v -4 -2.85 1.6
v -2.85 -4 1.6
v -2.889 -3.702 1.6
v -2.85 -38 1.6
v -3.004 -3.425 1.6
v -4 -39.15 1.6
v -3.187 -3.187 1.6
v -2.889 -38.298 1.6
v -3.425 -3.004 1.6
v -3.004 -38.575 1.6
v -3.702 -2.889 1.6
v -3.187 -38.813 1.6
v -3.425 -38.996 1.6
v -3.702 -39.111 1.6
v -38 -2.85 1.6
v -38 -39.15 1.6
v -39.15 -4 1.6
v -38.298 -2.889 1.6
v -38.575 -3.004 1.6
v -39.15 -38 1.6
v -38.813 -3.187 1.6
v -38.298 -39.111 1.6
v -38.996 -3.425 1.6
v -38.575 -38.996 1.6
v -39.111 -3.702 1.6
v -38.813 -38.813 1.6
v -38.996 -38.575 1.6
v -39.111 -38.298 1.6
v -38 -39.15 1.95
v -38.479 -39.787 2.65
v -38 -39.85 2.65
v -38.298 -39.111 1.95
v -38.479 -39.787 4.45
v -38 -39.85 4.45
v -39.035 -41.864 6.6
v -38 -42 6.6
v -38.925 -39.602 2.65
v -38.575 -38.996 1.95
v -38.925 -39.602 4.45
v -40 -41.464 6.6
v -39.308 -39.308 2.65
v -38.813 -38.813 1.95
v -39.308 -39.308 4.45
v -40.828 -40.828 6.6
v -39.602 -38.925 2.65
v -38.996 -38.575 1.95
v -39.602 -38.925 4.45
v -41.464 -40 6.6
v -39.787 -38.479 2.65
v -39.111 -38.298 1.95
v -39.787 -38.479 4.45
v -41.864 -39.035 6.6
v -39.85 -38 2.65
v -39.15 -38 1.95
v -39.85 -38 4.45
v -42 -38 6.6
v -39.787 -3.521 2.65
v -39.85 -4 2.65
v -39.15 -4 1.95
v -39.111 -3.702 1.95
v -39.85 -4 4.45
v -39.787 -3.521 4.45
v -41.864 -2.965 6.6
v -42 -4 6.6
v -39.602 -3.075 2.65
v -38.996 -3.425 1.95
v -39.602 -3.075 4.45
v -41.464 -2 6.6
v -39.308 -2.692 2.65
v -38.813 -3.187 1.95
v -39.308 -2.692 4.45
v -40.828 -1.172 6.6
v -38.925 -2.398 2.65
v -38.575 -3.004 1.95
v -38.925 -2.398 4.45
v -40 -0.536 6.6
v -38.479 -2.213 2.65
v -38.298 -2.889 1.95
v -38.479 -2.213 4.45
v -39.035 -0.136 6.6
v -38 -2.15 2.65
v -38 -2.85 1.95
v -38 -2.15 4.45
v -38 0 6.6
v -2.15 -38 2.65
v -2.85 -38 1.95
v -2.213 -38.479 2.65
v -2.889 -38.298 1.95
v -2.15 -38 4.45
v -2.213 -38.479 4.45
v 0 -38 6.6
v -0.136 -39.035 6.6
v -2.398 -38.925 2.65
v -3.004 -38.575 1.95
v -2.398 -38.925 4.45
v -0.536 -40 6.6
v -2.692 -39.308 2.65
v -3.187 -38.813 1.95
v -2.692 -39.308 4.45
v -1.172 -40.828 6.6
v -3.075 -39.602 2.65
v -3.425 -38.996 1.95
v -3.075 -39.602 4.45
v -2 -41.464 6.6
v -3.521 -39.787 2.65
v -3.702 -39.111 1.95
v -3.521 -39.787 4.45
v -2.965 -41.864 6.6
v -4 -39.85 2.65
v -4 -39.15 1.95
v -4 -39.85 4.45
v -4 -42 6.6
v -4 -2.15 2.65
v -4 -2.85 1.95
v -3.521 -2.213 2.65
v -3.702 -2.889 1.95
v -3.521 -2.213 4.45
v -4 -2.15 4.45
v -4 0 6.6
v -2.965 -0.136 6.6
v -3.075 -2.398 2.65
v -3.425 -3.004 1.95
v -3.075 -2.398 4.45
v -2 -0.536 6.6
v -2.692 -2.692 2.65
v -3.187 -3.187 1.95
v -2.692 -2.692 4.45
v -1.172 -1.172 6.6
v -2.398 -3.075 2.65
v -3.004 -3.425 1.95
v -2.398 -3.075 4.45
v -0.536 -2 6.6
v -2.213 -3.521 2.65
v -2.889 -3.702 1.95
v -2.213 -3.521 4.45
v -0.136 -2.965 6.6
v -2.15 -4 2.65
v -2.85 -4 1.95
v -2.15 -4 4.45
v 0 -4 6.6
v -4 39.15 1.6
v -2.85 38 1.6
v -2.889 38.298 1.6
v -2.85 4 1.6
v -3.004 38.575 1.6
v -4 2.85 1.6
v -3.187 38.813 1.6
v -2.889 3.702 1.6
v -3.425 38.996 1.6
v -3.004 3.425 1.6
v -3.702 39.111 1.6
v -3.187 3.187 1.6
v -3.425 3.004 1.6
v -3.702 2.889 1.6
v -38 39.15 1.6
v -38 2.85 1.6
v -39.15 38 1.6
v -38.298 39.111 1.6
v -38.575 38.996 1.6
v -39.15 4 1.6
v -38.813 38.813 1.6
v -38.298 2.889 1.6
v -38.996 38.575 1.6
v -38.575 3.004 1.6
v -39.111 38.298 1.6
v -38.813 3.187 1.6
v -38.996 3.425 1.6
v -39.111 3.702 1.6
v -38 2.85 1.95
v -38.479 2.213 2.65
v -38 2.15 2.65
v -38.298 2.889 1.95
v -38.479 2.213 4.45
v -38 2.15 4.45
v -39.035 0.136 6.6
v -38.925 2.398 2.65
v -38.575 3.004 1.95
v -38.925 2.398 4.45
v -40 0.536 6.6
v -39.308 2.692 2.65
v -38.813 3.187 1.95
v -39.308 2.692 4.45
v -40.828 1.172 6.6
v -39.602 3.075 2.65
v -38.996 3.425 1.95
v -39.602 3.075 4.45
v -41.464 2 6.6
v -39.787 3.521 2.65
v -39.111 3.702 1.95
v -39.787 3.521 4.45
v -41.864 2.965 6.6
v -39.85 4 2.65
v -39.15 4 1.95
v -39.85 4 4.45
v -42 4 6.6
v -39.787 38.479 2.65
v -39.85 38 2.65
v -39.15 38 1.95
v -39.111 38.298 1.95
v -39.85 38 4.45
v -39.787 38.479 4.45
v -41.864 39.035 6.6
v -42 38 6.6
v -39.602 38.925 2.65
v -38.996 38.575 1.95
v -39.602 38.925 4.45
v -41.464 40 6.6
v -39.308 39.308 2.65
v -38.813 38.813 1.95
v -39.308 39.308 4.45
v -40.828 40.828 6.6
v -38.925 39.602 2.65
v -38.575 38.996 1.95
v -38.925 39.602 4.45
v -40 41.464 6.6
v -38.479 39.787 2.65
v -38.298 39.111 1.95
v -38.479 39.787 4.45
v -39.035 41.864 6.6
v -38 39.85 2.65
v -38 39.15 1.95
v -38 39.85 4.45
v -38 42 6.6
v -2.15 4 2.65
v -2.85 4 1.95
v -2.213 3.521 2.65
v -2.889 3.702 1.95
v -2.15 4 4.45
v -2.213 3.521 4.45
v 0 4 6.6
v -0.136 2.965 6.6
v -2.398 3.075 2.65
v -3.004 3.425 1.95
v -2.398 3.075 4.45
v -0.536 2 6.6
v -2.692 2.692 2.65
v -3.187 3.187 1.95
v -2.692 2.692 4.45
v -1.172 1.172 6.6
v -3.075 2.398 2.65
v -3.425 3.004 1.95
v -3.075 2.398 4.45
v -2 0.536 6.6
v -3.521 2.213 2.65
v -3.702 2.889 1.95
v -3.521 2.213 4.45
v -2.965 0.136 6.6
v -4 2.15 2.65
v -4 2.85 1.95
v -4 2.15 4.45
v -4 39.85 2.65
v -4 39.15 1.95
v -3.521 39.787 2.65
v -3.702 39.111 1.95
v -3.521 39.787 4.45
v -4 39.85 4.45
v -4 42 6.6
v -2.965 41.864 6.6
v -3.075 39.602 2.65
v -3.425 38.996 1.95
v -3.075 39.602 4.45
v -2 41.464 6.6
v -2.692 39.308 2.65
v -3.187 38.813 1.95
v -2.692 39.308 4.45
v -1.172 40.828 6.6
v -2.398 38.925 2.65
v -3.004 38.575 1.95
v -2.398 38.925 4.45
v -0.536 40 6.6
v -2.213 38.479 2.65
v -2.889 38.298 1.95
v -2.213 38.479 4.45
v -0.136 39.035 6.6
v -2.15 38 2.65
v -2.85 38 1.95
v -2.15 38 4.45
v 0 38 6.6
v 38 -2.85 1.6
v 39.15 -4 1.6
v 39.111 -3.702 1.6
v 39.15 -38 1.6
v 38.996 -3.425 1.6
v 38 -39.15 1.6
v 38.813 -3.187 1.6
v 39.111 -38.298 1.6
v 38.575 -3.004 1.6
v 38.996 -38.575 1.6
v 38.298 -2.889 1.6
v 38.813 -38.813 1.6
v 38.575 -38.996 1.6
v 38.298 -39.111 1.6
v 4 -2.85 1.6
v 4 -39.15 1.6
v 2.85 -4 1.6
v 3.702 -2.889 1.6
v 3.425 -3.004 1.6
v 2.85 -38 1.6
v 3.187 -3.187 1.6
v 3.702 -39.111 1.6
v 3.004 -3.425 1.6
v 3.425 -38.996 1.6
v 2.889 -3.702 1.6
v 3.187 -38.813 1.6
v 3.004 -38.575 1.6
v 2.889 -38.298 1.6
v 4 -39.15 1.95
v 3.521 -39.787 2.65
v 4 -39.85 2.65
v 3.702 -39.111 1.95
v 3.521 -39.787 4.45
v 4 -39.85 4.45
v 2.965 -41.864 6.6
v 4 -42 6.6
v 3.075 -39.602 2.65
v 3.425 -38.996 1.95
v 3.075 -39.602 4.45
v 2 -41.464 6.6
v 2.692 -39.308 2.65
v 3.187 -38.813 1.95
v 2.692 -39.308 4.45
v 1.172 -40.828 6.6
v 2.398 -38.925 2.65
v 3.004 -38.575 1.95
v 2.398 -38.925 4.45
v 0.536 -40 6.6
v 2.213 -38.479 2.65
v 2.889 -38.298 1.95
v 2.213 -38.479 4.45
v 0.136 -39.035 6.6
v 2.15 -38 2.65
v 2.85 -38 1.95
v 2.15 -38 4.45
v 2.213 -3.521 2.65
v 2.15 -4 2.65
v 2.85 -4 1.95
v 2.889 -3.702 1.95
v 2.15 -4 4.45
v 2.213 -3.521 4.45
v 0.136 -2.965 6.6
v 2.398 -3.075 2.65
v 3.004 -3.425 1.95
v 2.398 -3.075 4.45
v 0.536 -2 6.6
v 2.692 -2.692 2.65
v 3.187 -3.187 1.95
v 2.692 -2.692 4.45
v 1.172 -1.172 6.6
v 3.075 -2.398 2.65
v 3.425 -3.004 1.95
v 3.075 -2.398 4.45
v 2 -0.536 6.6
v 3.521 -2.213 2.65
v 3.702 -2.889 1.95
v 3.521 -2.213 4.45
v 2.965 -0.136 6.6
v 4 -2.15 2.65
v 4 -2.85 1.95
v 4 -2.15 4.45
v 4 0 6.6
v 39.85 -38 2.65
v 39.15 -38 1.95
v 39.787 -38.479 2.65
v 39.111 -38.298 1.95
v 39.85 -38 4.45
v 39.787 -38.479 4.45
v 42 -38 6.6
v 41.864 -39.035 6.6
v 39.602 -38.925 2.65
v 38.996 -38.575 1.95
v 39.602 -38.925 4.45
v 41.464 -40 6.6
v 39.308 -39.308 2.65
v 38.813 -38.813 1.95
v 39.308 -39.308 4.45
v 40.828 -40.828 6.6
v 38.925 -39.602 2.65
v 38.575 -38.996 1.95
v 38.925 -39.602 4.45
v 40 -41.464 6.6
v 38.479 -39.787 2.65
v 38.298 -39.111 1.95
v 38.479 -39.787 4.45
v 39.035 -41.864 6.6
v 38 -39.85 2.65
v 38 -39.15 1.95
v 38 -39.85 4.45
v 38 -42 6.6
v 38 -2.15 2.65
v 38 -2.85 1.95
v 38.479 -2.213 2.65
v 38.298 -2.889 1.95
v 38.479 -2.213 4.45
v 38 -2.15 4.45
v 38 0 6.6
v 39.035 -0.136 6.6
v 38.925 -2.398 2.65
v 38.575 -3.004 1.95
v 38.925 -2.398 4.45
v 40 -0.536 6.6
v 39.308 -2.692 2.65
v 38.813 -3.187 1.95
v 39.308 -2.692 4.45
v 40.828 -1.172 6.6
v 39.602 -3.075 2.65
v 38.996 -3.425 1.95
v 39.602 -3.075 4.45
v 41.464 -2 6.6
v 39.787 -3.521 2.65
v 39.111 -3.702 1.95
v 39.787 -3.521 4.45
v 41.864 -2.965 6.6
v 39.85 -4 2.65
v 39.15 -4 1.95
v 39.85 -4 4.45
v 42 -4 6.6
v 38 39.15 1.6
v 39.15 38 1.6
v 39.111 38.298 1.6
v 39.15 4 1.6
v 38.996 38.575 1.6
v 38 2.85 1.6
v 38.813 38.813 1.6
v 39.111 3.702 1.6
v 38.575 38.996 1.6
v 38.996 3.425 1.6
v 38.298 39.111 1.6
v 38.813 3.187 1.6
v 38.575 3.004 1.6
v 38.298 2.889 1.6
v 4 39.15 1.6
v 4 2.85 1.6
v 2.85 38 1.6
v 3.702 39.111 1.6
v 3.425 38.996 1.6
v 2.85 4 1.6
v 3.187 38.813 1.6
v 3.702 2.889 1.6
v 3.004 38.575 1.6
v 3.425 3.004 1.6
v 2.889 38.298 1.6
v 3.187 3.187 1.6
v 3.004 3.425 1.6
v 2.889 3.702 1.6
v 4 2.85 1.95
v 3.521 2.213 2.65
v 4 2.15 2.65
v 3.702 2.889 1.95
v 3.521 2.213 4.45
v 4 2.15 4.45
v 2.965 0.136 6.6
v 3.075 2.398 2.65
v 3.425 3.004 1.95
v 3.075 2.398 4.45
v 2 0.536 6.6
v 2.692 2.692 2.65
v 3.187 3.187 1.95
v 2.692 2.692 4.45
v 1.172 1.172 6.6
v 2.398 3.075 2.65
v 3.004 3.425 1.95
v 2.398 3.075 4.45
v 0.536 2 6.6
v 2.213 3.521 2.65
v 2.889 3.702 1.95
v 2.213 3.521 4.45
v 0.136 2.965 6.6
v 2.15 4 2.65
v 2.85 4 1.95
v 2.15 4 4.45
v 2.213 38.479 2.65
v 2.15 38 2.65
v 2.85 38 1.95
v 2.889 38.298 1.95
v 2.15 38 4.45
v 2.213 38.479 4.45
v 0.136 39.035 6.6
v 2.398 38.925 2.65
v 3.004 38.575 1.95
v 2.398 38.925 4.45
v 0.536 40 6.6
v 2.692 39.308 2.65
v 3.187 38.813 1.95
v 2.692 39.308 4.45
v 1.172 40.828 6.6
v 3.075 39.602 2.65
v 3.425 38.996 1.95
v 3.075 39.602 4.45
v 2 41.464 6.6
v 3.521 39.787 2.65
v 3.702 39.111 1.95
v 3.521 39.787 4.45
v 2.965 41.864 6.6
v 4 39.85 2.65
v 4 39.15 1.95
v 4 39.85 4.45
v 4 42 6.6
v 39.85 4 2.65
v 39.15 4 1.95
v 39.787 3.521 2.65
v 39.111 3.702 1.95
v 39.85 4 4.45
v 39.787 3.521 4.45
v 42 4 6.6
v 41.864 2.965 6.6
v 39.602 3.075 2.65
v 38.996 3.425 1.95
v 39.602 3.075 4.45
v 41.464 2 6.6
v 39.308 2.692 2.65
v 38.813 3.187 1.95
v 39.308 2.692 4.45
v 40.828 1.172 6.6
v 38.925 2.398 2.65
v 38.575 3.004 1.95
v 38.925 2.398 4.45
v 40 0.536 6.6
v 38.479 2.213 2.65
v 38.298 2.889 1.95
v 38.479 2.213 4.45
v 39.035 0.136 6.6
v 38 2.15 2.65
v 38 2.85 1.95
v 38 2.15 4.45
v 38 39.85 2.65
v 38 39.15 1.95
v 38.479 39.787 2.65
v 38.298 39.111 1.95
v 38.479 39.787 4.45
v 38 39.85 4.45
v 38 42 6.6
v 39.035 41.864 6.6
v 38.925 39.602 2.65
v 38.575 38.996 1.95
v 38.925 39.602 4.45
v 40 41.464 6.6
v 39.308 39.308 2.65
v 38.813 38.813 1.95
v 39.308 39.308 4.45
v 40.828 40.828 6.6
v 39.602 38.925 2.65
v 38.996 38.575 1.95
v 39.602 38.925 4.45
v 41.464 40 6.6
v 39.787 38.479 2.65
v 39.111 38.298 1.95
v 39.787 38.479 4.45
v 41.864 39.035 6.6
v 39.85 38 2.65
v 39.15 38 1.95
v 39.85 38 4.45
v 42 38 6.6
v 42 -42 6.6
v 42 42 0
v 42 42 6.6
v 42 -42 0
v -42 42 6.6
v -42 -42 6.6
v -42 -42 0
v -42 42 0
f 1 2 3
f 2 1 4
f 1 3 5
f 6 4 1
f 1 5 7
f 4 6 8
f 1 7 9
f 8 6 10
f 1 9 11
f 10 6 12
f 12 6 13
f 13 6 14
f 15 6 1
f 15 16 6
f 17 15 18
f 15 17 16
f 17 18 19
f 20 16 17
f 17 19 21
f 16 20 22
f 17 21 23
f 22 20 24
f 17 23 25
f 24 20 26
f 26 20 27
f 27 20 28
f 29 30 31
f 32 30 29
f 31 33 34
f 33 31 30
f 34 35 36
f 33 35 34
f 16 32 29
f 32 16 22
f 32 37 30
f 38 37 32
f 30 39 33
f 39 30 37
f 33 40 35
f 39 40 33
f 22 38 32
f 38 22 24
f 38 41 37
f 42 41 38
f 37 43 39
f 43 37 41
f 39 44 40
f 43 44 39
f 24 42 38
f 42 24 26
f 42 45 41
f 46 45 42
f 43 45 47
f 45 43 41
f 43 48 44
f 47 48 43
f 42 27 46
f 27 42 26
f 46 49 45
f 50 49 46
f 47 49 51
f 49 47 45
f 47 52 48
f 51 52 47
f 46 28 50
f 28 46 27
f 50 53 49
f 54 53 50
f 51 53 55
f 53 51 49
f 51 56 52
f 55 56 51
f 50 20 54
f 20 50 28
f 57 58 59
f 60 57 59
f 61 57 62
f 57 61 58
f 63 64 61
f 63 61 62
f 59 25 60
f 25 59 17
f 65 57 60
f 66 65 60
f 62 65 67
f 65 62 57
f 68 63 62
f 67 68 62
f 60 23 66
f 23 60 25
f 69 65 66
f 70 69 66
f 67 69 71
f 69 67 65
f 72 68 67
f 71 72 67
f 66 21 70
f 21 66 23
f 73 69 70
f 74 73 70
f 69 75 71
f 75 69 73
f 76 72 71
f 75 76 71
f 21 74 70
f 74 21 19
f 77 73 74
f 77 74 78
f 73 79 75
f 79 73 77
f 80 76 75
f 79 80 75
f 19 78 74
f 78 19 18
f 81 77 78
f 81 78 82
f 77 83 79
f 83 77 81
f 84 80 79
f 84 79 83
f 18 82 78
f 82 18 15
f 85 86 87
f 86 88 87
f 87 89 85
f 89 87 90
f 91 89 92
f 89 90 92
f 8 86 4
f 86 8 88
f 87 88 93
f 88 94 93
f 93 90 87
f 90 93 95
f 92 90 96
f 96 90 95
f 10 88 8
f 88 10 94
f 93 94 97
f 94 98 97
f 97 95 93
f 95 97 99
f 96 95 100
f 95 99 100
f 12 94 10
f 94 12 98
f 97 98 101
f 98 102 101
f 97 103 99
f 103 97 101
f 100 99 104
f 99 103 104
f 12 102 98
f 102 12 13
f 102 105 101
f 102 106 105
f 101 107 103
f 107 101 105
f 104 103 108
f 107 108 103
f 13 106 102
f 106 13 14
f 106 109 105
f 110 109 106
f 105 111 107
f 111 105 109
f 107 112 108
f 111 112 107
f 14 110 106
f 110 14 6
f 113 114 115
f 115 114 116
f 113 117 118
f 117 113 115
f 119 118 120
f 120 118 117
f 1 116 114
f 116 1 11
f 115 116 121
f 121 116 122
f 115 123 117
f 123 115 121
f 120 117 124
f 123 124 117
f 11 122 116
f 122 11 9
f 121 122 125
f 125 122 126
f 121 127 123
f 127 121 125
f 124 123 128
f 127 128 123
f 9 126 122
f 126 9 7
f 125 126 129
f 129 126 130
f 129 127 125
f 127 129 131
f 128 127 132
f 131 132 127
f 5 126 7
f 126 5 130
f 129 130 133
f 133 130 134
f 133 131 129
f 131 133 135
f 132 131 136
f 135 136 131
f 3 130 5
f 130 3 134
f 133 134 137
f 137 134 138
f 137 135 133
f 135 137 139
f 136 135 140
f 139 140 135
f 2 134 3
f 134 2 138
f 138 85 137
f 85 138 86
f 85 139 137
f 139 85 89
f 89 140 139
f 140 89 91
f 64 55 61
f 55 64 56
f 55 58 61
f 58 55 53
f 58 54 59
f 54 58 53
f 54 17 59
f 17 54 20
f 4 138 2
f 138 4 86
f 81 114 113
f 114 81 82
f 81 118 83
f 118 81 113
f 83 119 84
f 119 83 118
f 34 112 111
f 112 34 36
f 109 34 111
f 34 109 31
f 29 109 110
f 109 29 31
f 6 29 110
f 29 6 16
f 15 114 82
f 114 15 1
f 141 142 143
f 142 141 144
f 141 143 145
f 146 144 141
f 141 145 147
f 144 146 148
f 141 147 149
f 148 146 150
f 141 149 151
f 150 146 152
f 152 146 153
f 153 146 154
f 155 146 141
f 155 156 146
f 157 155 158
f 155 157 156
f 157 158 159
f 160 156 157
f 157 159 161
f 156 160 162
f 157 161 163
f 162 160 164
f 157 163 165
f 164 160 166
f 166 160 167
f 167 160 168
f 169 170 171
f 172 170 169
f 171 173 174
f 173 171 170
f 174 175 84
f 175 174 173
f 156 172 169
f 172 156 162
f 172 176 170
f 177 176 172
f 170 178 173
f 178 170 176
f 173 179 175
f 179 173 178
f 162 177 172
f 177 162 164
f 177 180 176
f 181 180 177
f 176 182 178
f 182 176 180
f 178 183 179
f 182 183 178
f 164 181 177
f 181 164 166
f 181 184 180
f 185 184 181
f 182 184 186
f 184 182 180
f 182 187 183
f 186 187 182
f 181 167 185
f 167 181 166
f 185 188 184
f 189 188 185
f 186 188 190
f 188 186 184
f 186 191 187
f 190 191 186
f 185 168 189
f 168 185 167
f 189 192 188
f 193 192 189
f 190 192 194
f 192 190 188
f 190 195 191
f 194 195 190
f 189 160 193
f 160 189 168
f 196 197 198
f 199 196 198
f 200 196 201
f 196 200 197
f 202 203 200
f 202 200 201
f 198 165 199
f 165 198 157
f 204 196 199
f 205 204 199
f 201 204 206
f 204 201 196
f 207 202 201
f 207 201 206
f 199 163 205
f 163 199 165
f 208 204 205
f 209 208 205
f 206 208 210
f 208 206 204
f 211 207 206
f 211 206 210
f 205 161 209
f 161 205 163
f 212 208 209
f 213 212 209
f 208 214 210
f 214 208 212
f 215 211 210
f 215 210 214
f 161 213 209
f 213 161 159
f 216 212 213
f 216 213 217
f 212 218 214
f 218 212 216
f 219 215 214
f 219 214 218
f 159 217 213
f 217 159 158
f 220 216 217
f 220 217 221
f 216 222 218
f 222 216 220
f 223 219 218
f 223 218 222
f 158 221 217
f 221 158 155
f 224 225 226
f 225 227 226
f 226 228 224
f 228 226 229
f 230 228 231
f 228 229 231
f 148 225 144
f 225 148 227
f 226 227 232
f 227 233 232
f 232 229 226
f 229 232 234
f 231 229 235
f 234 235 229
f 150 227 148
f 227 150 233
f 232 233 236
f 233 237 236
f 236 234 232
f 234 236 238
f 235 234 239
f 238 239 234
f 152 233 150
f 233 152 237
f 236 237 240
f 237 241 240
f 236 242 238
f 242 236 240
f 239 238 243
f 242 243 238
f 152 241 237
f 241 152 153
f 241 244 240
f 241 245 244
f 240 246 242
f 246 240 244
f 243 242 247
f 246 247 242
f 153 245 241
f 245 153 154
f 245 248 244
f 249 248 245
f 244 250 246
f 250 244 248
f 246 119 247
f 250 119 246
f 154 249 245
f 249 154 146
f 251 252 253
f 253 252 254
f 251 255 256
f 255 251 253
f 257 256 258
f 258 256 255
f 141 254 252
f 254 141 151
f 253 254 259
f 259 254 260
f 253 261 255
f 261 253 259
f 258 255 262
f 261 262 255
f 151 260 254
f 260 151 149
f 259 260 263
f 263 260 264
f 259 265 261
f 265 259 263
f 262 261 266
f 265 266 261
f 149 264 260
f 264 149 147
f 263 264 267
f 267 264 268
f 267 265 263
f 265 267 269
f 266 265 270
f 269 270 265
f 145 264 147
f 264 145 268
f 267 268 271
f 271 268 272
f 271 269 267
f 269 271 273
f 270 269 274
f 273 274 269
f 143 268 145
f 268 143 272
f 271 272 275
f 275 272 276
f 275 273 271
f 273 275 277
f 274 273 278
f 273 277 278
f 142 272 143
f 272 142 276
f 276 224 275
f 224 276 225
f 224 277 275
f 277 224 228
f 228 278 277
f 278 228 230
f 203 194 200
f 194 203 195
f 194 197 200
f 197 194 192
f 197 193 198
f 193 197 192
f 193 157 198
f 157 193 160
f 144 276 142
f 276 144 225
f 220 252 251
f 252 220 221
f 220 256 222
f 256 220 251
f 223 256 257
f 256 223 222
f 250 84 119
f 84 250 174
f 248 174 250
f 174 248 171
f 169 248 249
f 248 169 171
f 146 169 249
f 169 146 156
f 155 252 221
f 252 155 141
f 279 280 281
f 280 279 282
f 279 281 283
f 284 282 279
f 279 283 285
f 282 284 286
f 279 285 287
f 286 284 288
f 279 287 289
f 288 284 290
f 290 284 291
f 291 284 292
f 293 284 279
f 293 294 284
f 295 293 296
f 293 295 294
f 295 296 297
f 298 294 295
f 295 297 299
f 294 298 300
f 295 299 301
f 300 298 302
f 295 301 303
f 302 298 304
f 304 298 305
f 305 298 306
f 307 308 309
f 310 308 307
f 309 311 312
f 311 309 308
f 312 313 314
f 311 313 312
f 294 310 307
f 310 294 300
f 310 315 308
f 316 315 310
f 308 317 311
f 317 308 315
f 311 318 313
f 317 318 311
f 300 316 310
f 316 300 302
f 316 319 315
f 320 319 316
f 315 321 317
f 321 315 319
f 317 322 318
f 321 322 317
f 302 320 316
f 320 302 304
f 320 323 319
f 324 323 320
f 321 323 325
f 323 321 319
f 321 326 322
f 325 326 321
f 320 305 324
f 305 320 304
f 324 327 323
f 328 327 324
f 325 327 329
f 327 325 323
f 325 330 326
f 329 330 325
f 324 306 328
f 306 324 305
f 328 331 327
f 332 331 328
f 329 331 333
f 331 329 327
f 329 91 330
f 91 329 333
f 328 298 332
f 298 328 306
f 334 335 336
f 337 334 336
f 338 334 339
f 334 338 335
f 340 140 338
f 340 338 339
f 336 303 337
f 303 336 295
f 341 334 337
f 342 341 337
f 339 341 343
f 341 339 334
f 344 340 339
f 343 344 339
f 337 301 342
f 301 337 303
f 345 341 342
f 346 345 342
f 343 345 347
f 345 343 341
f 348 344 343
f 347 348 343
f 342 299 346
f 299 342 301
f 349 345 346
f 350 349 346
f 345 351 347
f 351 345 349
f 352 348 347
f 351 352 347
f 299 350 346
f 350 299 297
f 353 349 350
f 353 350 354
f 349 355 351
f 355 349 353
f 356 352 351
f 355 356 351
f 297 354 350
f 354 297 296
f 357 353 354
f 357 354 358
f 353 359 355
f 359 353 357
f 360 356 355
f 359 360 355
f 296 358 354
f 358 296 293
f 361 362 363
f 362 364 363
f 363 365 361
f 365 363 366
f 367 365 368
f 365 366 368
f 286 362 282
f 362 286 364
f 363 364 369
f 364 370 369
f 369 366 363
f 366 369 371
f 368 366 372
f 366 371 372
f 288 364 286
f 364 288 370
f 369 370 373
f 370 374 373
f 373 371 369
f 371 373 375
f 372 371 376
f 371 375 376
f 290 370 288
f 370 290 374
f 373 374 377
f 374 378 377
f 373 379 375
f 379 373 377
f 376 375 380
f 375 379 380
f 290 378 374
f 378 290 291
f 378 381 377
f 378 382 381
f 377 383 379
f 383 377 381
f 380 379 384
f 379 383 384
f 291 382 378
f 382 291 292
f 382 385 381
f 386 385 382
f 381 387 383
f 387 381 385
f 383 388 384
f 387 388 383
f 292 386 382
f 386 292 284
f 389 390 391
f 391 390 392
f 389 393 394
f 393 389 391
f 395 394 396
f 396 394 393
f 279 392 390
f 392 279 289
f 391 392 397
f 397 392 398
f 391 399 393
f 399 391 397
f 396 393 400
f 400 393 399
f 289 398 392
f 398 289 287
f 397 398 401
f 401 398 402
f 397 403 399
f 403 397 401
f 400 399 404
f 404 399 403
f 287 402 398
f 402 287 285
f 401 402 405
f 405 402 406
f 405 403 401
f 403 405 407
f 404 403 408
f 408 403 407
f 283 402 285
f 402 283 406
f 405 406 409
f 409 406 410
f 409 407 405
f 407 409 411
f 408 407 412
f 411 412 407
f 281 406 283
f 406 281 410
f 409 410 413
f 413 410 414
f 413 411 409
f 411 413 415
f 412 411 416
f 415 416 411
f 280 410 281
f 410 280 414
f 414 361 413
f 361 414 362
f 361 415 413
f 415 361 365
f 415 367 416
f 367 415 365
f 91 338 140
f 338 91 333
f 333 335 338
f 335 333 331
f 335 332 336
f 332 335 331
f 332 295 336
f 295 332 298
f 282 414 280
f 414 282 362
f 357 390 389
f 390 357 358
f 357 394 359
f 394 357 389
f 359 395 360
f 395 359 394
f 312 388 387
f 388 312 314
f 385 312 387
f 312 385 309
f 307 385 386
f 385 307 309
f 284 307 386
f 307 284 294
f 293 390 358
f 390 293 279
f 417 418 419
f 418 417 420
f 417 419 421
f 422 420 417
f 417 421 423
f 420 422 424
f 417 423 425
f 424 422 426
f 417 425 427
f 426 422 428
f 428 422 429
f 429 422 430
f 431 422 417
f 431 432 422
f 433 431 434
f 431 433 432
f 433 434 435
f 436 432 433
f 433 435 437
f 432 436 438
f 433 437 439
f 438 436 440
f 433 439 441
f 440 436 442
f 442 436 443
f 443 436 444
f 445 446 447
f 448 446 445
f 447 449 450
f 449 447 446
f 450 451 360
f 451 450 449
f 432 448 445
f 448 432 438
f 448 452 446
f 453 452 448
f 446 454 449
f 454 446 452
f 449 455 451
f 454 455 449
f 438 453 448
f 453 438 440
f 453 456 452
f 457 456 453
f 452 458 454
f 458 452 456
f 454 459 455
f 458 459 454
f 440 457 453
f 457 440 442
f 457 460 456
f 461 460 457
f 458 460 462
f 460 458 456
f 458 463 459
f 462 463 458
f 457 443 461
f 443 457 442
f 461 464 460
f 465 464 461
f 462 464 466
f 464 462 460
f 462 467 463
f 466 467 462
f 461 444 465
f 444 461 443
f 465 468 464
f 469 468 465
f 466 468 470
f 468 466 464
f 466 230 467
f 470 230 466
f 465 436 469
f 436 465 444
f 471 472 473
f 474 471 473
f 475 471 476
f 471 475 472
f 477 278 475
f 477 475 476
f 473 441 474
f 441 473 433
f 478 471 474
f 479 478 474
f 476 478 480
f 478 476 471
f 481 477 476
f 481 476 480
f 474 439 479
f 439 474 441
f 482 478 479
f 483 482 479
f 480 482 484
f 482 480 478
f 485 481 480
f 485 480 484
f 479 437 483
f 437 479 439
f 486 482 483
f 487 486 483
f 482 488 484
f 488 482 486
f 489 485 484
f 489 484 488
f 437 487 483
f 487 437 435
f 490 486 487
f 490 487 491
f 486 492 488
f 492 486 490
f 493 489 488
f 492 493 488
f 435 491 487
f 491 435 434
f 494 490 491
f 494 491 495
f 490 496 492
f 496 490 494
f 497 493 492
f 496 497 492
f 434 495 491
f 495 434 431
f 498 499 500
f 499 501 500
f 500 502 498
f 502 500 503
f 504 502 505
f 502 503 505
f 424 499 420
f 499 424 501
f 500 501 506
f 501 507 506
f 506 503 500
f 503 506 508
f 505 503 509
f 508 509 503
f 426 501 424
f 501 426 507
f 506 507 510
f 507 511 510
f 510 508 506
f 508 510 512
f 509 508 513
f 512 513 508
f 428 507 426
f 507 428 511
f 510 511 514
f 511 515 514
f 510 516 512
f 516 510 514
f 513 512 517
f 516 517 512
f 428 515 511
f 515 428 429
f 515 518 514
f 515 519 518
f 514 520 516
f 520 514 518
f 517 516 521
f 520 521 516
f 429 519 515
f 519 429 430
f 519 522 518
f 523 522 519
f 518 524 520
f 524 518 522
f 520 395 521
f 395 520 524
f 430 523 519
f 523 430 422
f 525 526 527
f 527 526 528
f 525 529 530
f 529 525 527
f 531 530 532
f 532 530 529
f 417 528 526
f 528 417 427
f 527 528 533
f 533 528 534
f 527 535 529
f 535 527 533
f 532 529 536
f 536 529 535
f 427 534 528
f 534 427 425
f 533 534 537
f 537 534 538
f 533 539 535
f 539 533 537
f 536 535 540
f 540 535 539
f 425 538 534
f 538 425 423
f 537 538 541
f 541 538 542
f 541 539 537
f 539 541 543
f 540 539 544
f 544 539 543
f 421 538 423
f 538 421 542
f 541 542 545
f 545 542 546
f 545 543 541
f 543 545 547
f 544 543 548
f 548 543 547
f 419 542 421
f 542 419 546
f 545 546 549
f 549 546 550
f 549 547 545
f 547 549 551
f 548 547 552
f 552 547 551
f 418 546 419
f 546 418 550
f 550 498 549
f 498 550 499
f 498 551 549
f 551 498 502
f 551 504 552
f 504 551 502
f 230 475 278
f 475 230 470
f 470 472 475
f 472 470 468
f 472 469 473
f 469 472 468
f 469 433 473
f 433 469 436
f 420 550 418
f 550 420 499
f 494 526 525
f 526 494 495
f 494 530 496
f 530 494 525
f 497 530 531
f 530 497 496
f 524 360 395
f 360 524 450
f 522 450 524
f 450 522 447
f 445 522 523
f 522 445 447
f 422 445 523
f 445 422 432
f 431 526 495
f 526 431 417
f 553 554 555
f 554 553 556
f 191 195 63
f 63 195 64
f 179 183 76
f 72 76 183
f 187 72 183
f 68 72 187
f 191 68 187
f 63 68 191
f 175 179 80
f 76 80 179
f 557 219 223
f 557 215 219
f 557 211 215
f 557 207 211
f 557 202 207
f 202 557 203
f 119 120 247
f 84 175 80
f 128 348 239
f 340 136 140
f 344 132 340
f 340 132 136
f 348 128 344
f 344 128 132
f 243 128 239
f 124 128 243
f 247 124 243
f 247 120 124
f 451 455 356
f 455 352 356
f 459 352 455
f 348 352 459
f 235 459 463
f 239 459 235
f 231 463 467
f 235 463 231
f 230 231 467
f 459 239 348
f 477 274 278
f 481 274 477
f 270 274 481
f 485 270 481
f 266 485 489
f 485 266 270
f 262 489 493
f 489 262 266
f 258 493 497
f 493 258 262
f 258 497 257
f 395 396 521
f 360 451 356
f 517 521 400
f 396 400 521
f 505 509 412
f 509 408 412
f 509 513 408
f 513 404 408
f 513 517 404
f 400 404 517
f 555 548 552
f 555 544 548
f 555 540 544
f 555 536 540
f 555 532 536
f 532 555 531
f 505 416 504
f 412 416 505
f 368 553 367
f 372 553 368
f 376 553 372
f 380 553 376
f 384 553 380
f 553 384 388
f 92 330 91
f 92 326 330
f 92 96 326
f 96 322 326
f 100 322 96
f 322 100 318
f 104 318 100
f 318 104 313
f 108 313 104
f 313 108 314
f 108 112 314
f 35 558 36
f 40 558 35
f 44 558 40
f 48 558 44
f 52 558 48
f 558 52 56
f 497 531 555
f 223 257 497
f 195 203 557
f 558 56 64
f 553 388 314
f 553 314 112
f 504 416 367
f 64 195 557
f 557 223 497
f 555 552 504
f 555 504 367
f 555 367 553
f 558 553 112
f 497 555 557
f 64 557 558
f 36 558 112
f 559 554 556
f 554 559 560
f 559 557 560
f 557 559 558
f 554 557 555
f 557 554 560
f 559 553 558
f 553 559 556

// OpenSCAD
// Gridfinity baseplate; print flat backing down, sockets facing up. Millimetres.
// A closed backing keeps it rigid and supports optional glued 6 x 2 mm magnets.
// Magnet pockets open into the sockets; check polarity before gluing.
grid_x = 2; // Number of 42 mm columns [1:1:5]
grid_y = 2; // Number of 42 mm rows [1:1:5]
magnet_pockets = false; // Add four upward-facing magnet pockets in each cell
screw_holes = false; // Add coaxial 3.2 mm through holes with countersinks for M3 screws
backing = 1.6; // Minimum solid backing below the sockets or magnets, mm [1.2:0.2:3]
magnet_clearance = 0.4; // Added to 6 mm magnet diameter for glue fit, mm [0.2:0.1:0.4]
magnet_depth = 2.2; // Pocket depth for 2 mm thick magnets, mm [2:0.1:2.4]

// Original dimensional references (implementation written for this example):
// https://gridfinity.xyz/specification/
// https://kennetek.github.io/gridfinity-rebuilt-openscad/constants/
// https://github.com/kennetek/gridfinity-rebuilt-openscad/blob/main/src/core/standard.scad
// https://github.com/kennetek/gridfinity-rebuilt-openscad/blob/main/src/core/gridfinity-baseplate.scad
// Socket: 36.3 -> 37.7 -> 42 mm, radii 1.15 -> 1.85 -> 4 mm.
// The standard 5 mm socket has 0.35 mm relief below its 0.7/1.8/2.15 profile.
// Our added backing is below that datum, preserving the mating geometry.
// Seat the bin foot bottom at socket_z; its joining slab starts 5 mm above it.
/* [Hidden] */
eps = 0.02;
socket_z = backing + (magnet_pockets ? magnet_depth : 0) + (screw_holes ? 1.6 : 0);
plate_height = socket_z+5;
assert(grid_x>=1 && grid_y>=1 && grid_x==floor(grid_x) && grid_y==floor(grid_y),
    "Grid counts must be positive integers");
assert(backing>=1.2,"Use at least 1.2 mm of solid backing");

module socket() {
    rounded_profile(17,17,[[1.15,0],[1.15,0.35],[1.85,1.05],
        [1.85,2.85],[4,5],[4,5+eps]]);
}

module gridfinity_baseplate() {
    difference() {
        // Square perimeter tiles exactly on the grid. The backing supports
        // the intentionally tapered socket ridges at the top of the plate.
        translate([-grid_x*21,-grid_y*21,0])
            cube([grid_x*42,grid_y*42,plate_height]);
        for (ix=[0:grid_x-1], iy=[0:grid_y-1])
            translate([(ix-(grid_x-1)/2)*42,(iy-(grid_y-1)/2)*42,0]) {
                translate([0,0,socket_z]) socket();
                for (sx=[-1,1], sy=[-1,1]) translate([sx*13,sy*13,0]) {
                    if (magnet_pockets)
                        translate([0,0,socket_z-magnet_depth])
                            cylinder(h=magnet_depth+eps,d=6+magnet_clearance,$fn=24);
                    if (screw_holes) {
                        translate([0,0,-eps])
                            cylinder(h=socket_z+2*eps,d=3.2,$fn=20);
                        // A 90-degree countersunk head sits flush below the
                        // socket floor, or below the magnet when both are used.
                        translate([0,0,socket_z-(magnet_pockets ? magnet_depth : 0)-1.6])
                            cylinder(h=1.6+eps,d1=3.2,d2=6.4+2*eps,$fn=24);
                    }
                }
            }
    }
}

// Fill a rounded rectangle from radius/height stations. Corner centres stay
// fixed: changing radius by the same amount as Z makes a true 45-degree slope.
// Two extruded sections and four turned corners avoid hulls and external libs.
module rounded_profile(cx, cy, stations) {
    union() {
        rotate([90,0,0]) linear_extrude(height=2*cy, center=true)
            polygon(concat(
                [for (p=stations) [cx+p[0],p[1]]],
                [for (i=[len(stations)-1:-1:0])
                    [-cx-stations[i][0],stations[i][1]]]));
        rotate([90,0,90]) linear_extrude(height=2*cx, center=true)
            polygon(concat(
                [for (p=stations) [cy+p[0],p[1]]],
                [for (i=[len(stations)-1:-1:0])
                    [-cy-stations[i][0],stations[i][1]]]));
        for (x=[-cx,cx], y=[-cy,cy]) translate([x,y,0])
            rotate_extrude($fn=24)
                polygon(concat([[0,stations[0][1]]], stations,
                    [[0,stations[len(stations)-1][1]]]));
    }
}

color("#d9dde2") gridfinity_baseplate();
